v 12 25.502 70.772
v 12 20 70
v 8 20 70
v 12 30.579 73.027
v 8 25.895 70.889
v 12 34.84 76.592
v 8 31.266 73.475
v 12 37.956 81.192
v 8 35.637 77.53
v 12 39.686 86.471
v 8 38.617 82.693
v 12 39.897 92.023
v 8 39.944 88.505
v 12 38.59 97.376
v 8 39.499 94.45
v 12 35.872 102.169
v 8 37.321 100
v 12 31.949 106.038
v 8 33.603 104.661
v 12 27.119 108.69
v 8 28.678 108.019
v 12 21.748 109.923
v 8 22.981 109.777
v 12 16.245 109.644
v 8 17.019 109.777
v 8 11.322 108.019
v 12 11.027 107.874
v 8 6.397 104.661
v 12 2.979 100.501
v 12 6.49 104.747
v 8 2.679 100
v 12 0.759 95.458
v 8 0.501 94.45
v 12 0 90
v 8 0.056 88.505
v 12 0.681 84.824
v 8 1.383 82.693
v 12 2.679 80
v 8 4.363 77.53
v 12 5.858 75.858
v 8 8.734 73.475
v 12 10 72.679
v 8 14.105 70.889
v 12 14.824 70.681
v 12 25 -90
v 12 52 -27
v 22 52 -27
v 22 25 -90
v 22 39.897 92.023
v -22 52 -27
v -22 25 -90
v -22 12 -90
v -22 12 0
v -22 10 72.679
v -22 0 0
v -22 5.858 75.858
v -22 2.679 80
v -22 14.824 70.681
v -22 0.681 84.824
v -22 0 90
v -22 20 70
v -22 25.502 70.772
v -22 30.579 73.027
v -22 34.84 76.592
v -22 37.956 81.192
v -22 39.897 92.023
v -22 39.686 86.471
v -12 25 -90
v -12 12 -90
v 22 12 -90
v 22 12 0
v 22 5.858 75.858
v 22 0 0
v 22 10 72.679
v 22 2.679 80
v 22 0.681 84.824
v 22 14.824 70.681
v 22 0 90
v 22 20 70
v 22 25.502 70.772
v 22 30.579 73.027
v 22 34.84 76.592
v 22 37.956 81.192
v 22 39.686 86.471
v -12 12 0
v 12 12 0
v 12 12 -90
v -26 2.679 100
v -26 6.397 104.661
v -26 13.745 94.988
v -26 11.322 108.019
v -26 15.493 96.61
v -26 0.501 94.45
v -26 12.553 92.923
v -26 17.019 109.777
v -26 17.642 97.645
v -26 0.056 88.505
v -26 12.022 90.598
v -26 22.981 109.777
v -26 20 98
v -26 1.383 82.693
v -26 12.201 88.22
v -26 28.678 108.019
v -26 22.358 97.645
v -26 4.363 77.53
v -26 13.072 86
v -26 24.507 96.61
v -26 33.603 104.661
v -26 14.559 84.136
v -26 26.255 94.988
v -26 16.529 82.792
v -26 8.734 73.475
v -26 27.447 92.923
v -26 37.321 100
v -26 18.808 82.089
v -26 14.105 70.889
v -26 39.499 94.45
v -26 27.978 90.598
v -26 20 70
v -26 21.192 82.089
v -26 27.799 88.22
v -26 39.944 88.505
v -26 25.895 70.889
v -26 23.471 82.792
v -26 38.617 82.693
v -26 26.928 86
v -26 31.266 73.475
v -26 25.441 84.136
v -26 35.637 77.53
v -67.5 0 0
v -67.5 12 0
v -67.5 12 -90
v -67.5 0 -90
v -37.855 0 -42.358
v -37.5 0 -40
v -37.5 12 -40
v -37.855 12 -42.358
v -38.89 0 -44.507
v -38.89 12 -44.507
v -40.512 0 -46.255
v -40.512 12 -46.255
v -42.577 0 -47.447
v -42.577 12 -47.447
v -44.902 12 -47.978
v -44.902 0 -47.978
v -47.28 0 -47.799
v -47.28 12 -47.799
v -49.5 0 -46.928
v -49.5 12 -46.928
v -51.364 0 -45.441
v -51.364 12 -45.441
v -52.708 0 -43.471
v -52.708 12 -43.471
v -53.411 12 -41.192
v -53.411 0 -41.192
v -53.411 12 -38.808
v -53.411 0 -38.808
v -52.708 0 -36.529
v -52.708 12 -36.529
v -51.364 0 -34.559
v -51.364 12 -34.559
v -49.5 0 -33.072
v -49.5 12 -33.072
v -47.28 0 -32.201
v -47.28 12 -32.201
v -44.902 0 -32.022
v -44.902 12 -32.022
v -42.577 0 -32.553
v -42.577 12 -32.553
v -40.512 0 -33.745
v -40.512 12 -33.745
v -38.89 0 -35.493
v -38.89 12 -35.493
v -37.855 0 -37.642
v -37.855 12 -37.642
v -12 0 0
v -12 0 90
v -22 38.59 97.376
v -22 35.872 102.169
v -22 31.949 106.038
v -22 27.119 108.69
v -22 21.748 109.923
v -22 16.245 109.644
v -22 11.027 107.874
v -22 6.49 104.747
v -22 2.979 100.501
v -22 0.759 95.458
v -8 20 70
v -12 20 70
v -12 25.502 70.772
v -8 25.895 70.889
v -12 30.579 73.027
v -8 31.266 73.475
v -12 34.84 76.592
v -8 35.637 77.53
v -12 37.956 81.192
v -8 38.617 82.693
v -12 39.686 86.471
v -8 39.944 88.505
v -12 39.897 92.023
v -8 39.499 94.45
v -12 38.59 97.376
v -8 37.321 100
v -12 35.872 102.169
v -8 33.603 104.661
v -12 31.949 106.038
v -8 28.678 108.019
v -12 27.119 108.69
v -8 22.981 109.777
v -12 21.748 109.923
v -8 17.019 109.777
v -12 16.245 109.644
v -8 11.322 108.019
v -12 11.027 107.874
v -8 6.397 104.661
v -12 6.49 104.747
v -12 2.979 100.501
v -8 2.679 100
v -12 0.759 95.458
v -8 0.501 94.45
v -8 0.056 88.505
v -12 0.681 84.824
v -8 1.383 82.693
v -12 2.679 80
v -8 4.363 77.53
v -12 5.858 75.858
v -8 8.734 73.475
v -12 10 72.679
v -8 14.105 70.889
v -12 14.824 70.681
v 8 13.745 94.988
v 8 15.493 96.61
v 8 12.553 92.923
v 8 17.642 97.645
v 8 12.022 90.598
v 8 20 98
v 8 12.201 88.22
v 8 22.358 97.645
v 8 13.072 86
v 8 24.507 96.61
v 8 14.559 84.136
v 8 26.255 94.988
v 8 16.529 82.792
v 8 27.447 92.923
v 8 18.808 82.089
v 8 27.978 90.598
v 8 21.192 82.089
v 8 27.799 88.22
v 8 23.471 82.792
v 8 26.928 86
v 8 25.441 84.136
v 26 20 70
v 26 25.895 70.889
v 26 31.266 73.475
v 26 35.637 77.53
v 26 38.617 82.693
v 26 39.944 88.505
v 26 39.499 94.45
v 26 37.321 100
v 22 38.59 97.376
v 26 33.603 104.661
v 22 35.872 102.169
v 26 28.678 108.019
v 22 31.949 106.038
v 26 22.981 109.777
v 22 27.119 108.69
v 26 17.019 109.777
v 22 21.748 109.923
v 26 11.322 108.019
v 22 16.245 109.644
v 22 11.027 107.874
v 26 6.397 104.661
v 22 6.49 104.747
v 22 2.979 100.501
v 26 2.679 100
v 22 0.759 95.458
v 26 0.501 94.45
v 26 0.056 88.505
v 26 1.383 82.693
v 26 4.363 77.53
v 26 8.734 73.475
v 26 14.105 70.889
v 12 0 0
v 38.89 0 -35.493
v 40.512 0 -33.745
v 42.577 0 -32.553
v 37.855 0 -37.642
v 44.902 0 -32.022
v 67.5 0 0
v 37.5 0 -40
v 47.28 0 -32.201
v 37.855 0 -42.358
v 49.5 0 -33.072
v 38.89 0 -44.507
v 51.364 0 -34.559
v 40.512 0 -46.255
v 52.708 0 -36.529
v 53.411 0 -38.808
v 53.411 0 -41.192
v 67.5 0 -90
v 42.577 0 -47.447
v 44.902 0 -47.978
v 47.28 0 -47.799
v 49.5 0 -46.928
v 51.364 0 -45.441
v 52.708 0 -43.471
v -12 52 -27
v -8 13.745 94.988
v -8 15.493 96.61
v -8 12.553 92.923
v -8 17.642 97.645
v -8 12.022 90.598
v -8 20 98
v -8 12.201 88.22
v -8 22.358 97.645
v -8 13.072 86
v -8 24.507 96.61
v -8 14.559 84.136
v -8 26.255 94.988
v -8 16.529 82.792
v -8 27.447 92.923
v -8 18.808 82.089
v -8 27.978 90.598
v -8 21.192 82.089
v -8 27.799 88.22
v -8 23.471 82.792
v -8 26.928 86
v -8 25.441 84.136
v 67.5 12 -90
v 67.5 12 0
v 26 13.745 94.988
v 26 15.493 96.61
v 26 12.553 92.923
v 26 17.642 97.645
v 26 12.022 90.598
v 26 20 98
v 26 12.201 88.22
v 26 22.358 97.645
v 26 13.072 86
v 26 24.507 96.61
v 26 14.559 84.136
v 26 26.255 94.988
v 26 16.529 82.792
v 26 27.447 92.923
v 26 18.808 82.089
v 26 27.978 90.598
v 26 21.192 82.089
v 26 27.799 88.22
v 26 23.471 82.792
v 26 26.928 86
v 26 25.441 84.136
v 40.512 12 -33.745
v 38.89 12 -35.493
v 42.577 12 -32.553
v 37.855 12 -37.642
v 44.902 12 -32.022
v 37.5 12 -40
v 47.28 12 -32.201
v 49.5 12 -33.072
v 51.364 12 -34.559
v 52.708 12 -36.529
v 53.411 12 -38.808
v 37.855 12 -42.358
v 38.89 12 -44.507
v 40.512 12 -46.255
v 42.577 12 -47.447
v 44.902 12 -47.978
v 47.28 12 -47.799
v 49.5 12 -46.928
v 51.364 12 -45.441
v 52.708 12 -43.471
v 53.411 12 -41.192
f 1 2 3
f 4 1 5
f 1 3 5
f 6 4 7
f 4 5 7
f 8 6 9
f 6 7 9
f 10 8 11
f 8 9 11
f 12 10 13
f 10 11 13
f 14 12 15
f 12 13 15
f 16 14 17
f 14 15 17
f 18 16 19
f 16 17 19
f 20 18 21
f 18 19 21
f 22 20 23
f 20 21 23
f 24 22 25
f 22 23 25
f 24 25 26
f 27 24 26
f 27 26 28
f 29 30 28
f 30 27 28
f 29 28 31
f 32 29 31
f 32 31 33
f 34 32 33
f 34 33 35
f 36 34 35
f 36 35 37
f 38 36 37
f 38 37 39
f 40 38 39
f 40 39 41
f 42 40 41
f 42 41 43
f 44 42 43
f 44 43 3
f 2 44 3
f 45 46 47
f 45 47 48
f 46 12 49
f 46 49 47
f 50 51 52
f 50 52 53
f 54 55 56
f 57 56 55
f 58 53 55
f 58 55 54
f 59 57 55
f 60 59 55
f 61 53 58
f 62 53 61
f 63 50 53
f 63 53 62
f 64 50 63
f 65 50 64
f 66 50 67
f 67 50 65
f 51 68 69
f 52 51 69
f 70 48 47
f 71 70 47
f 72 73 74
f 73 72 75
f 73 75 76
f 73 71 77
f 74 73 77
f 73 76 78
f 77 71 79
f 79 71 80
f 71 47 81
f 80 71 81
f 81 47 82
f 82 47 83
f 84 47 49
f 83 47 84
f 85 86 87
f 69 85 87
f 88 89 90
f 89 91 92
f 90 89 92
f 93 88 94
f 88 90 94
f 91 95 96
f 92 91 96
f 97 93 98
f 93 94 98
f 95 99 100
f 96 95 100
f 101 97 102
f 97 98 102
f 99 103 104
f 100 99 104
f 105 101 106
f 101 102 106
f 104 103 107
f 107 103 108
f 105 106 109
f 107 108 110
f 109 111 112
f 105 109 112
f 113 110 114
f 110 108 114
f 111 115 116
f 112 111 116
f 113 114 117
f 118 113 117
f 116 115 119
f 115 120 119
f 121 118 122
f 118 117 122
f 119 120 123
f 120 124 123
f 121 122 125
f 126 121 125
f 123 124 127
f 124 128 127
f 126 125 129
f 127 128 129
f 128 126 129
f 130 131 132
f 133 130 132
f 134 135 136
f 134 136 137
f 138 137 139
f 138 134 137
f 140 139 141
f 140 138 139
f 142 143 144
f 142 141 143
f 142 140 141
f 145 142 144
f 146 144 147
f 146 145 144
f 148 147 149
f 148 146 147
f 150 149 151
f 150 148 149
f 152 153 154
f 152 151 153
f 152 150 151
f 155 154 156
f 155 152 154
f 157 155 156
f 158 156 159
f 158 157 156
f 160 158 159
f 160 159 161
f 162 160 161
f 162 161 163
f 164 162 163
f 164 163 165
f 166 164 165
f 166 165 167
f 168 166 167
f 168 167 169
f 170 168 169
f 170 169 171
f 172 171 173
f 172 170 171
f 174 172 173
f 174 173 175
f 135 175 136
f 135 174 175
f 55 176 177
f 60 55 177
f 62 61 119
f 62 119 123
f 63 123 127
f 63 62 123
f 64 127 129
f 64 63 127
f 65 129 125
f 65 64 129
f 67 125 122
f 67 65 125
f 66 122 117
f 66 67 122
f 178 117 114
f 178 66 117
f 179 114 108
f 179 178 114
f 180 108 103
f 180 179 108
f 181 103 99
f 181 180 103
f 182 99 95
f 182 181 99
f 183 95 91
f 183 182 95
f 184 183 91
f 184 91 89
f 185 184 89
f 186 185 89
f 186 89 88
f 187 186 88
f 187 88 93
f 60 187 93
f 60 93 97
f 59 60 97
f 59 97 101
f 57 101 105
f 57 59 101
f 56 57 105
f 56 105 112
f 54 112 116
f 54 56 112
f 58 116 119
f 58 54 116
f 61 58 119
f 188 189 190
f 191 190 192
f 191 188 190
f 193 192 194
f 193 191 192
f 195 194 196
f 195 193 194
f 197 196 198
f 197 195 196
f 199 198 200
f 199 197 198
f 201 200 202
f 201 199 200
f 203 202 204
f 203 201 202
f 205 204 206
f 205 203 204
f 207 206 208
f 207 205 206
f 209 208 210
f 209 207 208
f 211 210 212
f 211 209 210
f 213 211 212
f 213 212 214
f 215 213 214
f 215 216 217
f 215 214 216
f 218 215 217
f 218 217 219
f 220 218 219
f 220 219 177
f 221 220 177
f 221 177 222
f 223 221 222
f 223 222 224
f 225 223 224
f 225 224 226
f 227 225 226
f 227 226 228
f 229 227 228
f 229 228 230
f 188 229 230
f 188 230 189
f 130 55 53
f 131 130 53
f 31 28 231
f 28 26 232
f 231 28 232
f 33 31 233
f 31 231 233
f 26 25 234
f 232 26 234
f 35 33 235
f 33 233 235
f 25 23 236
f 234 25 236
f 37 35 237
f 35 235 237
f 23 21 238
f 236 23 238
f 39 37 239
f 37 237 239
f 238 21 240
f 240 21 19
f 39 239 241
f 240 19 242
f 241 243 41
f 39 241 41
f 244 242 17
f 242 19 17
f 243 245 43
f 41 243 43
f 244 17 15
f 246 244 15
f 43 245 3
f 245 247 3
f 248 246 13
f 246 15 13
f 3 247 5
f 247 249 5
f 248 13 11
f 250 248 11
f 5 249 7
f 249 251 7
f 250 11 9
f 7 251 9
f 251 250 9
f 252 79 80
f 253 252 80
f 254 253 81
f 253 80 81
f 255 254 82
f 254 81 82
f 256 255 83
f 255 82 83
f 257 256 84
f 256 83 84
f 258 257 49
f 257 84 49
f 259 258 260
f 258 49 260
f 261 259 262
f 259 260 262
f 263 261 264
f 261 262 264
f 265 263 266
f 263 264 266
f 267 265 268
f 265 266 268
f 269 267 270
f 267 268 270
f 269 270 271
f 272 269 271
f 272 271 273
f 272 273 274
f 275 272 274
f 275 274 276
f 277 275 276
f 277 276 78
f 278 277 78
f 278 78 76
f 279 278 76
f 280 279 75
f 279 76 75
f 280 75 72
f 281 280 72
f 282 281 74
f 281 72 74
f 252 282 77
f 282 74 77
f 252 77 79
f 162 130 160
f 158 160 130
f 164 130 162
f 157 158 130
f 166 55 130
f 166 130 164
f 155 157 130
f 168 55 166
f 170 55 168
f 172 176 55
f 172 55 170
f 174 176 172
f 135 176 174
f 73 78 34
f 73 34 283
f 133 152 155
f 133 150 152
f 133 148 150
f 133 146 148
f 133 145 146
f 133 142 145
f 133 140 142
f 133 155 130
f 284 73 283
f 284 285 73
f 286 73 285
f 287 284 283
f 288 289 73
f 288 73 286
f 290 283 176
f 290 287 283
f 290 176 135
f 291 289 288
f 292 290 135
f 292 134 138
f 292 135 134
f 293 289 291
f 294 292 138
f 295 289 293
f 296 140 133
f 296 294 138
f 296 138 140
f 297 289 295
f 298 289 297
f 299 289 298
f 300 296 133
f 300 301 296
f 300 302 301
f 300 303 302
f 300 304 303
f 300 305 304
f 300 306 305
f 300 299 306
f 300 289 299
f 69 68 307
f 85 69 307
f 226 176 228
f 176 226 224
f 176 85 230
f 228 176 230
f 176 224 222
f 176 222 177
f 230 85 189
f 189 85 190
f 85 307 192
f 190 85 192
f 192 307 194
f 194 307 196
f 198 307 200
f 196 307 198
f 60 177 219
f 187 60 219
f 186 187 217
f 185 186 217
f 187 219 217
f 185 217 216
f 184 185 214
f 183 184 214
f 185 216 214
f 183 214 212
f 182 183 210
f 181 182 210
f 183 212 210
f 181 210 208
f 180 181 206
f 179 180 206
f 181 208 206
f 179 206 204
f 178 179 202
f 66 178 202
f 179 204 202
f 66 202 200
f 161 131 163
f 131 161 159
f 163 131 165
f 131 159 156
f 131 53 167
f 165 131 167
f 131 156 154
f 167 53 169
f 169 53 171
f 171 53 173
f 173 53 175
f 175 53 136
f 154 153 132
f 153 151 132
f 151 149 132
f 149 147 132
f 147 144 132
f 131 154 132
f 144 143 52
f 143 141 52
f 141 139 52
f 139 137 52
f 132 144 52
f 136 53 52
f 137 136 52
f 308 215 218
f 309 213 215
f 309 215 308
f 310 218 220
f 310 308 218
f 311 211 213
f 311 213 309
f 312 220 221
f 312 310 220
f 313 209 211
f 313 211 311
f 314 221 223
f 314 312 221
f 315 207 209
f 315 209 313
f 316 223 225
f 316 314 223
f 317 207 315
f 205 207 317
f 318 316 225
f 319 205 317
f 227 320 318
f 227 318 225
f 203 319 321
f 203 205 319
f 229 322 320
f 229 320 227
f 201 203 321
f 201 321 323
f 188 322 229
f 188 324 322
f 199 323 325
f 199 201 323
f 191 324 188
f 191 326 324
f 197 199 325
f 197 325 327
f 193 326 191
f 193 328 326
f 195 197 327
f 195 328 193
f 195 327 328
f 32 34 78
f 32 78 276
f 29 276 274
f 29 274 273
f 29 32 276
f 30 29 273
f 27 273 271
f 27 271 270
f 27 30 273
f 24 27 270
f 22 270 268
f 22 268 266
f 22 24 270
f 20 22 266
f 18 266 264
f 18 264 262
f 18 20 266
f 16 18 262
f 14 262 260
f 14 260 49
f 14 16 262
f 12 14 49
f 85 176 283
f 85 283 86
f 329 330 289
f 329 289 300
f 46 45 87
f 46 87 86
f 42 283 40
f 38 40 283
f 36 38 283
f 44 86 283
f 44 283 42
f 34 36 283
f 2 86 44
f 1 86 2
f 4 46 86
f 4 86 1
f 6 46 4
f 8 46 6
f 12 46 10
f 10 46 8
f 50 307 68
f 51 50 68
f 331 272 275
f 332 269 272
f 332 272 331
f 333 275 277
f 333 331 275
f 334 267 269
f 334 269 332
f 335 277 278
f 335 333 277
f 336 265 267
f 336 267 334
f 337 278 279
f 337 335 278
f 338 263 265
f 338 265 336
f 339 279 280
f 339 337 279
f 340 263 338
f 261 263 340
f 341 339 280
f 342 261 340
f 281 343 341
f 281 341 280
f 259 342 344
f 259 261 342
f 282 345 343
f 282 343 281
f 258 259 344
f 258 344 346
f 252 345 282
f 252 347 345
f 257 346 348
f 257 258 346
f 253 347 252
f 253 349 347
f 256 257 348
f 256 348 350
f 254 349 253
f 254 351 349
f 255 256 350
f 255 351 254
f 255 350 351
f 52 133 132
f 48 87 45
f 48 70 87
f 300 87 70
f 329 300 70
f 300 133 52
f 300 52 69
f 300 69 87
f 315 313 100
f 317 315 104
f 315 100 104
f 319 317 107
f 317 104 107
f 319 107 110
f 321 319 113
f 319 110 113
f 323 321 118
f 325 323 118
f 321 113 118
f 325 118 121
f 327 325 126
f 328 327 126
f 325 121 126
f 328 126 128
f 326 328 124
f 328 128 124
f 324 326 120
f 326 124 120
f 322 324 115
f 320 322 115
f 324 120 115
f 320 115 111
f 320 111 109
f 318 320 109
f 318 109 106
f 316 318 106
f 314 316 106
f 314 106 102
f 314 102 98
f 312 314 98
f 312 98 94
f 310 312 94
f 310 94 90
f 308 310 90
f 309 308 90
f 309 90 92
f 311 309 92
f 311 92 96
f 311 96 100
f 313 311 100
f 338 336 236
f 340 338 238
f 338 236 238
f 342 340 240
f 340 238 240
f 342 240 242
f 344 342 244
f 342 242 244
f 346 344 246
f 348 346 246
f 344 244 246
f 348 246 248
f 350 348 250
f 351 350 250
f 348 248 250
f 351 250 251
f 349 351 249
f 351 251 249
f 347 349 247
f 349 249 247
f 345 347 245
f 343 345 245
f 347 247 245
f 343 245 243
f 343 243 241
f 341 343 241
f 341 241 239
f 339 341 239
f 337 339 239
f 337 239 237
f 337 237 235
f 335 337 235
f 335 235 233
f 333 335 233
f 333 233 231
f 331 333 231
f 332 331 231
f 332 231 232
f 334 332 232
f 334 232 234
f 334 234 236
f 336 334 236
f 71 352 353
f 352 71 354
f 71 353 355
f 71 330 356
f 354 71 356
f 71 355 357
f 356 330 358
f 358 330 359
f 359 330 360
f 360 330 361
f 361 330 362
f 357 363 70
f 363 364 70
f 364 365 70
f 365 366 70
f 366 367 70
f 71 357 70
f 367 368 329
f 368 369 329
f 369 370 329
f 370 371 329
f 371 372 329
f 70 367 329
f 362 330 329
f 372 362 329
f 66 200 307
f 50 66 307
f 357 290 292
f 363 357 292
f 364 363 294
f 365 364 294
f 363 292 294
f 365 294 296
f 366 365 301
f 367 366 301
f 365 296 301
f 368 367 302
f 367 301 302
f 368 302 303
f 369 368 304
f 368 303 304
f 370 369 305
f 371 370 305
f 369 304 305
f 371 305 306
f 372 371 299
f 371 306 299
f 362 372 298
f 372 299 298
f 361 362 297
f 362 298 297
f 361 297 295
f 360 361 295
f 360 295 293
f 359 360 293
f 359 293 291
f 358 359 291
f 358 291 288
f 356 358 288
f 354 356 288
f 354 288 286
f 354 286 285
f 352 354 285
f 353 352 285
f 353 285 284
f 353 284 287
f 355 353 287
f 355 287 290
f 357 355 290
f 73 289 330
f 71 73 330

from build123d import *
from build123d.topology import SkipClean

# Parameters (mm, degrees)
SKETCH1_W           = 90
SKETCH1_H           = 12
BOSS_EXTRUDE1_DEPTH = 67.5
BOSS_EXTRUDE2_START = 12
BOSS_EXTRUDE2_DEPTH = 10
BOSS_EXTRUDE3_START = -14
SKETCH3_R           = 20
BOSS_EXTRUDE3_DEPTH = 18
HOLE1_D             = 16
HOLE2_D             = 16


with BuildPart() as part:
    # Sketch1 → Boss-Extrude1 (new, symmetric)
    with BuildSketch(Plane(origin=(0, 0, 0), x_dir=(0, 0, -1), z_dir=(1, 0, 0))):
        with Locations((45, 6)):
            Rectangle(SKETCH1_W, SKETCH1_H)
    extrude(amount=BOSS_EXTRUDE1_DEPTH, both=True)

    # Sketch2 → Boss-Extrude2 (add)
    with BuildSketch(Plane(origin=(0, 0, 0), x_dir=(0, 0, -1), z_dir=(1, 0, 0)).offset(BOSS_EXTRUDE2_START)):
        with BuildLine():
            Line((90, 12), (0, 12))
            Line((0, 12), (0, 0))
            Line((0, 0), (-90, 0))
            ThreePointArc((-90, 0), (-109.974333849, 18.987089694), (-92.023220861, 39.897401271))
            Line((-92.023220861, 39.897401271), (27, 52))
            Line((27, 52), (90, 25))
            Line((90, 25), (90, 12))
        make_face()
    boss_extrude2 = extrude(amount=BOSS_EXTRUDE2_DEPTH)

    # Sketch3 → Boss-Extrude3 (add)
    with SkipClean():  # the faces are left unmerged after this step: merging them gives an invalid solid
        with BuildSketch(Plane(origin=(22, 0, 0), x_dir=(0, 0, -1), z_dir=(1, 0, 0)).offset(BOSS_EXTRUDE3_START)):
            with Locations((-90, 20)):
                Circle(SKETCH3_R)
        boss_extrude3 = extrude(amount=BOSS_EXTRUDE3_DEPTH)

    # Mirror1: Boss-Extrude2, Boss-Extrude3 across plane
    with SkipClean():  # the faces are left unmerged after this step: merging them gives an invalid solid
        add(boss_extrude2.mirror(Plane(origin=(0, 0, 0), x_dir=(0, 0, 1), z_dir=(1, 0, 0))))
        add(boss_extrude3.mirror(Plane(origin=(0, 0, 0), x_dir=(0, 0, 1), z_dir=(1, 0, 0))))

    # Hole1 (through all)
    with Locations(Plane(origin=(26, 0, 0), x_dir=(0, 0, -1), z_dir=(1, 0, 0))):
        with Locations((-90, 20)):
            Hole(HOLE1_D / 2)

    # Hole2 (through all)
    with Locations(Plane(origin=(0, 12, 0), x_dir=(1, 0, 0), z_dir=(0, 1, 0))):
        with Locations((45.5, 40)):
            hole2 = Hole(HOLE2_D / 2)

    # Mirror2: Hole2 across plane
    with SkipClean():  # the faces are left unmerged after this step: merging them gives an invalid solid
        add(hole2.mirror(Plane(origin=(0, 0, 0), x_dir=(0, 0, 1), z_dir=(1, 0, 0))), mode=Mode.SUBTRACT)


solid = part.part
